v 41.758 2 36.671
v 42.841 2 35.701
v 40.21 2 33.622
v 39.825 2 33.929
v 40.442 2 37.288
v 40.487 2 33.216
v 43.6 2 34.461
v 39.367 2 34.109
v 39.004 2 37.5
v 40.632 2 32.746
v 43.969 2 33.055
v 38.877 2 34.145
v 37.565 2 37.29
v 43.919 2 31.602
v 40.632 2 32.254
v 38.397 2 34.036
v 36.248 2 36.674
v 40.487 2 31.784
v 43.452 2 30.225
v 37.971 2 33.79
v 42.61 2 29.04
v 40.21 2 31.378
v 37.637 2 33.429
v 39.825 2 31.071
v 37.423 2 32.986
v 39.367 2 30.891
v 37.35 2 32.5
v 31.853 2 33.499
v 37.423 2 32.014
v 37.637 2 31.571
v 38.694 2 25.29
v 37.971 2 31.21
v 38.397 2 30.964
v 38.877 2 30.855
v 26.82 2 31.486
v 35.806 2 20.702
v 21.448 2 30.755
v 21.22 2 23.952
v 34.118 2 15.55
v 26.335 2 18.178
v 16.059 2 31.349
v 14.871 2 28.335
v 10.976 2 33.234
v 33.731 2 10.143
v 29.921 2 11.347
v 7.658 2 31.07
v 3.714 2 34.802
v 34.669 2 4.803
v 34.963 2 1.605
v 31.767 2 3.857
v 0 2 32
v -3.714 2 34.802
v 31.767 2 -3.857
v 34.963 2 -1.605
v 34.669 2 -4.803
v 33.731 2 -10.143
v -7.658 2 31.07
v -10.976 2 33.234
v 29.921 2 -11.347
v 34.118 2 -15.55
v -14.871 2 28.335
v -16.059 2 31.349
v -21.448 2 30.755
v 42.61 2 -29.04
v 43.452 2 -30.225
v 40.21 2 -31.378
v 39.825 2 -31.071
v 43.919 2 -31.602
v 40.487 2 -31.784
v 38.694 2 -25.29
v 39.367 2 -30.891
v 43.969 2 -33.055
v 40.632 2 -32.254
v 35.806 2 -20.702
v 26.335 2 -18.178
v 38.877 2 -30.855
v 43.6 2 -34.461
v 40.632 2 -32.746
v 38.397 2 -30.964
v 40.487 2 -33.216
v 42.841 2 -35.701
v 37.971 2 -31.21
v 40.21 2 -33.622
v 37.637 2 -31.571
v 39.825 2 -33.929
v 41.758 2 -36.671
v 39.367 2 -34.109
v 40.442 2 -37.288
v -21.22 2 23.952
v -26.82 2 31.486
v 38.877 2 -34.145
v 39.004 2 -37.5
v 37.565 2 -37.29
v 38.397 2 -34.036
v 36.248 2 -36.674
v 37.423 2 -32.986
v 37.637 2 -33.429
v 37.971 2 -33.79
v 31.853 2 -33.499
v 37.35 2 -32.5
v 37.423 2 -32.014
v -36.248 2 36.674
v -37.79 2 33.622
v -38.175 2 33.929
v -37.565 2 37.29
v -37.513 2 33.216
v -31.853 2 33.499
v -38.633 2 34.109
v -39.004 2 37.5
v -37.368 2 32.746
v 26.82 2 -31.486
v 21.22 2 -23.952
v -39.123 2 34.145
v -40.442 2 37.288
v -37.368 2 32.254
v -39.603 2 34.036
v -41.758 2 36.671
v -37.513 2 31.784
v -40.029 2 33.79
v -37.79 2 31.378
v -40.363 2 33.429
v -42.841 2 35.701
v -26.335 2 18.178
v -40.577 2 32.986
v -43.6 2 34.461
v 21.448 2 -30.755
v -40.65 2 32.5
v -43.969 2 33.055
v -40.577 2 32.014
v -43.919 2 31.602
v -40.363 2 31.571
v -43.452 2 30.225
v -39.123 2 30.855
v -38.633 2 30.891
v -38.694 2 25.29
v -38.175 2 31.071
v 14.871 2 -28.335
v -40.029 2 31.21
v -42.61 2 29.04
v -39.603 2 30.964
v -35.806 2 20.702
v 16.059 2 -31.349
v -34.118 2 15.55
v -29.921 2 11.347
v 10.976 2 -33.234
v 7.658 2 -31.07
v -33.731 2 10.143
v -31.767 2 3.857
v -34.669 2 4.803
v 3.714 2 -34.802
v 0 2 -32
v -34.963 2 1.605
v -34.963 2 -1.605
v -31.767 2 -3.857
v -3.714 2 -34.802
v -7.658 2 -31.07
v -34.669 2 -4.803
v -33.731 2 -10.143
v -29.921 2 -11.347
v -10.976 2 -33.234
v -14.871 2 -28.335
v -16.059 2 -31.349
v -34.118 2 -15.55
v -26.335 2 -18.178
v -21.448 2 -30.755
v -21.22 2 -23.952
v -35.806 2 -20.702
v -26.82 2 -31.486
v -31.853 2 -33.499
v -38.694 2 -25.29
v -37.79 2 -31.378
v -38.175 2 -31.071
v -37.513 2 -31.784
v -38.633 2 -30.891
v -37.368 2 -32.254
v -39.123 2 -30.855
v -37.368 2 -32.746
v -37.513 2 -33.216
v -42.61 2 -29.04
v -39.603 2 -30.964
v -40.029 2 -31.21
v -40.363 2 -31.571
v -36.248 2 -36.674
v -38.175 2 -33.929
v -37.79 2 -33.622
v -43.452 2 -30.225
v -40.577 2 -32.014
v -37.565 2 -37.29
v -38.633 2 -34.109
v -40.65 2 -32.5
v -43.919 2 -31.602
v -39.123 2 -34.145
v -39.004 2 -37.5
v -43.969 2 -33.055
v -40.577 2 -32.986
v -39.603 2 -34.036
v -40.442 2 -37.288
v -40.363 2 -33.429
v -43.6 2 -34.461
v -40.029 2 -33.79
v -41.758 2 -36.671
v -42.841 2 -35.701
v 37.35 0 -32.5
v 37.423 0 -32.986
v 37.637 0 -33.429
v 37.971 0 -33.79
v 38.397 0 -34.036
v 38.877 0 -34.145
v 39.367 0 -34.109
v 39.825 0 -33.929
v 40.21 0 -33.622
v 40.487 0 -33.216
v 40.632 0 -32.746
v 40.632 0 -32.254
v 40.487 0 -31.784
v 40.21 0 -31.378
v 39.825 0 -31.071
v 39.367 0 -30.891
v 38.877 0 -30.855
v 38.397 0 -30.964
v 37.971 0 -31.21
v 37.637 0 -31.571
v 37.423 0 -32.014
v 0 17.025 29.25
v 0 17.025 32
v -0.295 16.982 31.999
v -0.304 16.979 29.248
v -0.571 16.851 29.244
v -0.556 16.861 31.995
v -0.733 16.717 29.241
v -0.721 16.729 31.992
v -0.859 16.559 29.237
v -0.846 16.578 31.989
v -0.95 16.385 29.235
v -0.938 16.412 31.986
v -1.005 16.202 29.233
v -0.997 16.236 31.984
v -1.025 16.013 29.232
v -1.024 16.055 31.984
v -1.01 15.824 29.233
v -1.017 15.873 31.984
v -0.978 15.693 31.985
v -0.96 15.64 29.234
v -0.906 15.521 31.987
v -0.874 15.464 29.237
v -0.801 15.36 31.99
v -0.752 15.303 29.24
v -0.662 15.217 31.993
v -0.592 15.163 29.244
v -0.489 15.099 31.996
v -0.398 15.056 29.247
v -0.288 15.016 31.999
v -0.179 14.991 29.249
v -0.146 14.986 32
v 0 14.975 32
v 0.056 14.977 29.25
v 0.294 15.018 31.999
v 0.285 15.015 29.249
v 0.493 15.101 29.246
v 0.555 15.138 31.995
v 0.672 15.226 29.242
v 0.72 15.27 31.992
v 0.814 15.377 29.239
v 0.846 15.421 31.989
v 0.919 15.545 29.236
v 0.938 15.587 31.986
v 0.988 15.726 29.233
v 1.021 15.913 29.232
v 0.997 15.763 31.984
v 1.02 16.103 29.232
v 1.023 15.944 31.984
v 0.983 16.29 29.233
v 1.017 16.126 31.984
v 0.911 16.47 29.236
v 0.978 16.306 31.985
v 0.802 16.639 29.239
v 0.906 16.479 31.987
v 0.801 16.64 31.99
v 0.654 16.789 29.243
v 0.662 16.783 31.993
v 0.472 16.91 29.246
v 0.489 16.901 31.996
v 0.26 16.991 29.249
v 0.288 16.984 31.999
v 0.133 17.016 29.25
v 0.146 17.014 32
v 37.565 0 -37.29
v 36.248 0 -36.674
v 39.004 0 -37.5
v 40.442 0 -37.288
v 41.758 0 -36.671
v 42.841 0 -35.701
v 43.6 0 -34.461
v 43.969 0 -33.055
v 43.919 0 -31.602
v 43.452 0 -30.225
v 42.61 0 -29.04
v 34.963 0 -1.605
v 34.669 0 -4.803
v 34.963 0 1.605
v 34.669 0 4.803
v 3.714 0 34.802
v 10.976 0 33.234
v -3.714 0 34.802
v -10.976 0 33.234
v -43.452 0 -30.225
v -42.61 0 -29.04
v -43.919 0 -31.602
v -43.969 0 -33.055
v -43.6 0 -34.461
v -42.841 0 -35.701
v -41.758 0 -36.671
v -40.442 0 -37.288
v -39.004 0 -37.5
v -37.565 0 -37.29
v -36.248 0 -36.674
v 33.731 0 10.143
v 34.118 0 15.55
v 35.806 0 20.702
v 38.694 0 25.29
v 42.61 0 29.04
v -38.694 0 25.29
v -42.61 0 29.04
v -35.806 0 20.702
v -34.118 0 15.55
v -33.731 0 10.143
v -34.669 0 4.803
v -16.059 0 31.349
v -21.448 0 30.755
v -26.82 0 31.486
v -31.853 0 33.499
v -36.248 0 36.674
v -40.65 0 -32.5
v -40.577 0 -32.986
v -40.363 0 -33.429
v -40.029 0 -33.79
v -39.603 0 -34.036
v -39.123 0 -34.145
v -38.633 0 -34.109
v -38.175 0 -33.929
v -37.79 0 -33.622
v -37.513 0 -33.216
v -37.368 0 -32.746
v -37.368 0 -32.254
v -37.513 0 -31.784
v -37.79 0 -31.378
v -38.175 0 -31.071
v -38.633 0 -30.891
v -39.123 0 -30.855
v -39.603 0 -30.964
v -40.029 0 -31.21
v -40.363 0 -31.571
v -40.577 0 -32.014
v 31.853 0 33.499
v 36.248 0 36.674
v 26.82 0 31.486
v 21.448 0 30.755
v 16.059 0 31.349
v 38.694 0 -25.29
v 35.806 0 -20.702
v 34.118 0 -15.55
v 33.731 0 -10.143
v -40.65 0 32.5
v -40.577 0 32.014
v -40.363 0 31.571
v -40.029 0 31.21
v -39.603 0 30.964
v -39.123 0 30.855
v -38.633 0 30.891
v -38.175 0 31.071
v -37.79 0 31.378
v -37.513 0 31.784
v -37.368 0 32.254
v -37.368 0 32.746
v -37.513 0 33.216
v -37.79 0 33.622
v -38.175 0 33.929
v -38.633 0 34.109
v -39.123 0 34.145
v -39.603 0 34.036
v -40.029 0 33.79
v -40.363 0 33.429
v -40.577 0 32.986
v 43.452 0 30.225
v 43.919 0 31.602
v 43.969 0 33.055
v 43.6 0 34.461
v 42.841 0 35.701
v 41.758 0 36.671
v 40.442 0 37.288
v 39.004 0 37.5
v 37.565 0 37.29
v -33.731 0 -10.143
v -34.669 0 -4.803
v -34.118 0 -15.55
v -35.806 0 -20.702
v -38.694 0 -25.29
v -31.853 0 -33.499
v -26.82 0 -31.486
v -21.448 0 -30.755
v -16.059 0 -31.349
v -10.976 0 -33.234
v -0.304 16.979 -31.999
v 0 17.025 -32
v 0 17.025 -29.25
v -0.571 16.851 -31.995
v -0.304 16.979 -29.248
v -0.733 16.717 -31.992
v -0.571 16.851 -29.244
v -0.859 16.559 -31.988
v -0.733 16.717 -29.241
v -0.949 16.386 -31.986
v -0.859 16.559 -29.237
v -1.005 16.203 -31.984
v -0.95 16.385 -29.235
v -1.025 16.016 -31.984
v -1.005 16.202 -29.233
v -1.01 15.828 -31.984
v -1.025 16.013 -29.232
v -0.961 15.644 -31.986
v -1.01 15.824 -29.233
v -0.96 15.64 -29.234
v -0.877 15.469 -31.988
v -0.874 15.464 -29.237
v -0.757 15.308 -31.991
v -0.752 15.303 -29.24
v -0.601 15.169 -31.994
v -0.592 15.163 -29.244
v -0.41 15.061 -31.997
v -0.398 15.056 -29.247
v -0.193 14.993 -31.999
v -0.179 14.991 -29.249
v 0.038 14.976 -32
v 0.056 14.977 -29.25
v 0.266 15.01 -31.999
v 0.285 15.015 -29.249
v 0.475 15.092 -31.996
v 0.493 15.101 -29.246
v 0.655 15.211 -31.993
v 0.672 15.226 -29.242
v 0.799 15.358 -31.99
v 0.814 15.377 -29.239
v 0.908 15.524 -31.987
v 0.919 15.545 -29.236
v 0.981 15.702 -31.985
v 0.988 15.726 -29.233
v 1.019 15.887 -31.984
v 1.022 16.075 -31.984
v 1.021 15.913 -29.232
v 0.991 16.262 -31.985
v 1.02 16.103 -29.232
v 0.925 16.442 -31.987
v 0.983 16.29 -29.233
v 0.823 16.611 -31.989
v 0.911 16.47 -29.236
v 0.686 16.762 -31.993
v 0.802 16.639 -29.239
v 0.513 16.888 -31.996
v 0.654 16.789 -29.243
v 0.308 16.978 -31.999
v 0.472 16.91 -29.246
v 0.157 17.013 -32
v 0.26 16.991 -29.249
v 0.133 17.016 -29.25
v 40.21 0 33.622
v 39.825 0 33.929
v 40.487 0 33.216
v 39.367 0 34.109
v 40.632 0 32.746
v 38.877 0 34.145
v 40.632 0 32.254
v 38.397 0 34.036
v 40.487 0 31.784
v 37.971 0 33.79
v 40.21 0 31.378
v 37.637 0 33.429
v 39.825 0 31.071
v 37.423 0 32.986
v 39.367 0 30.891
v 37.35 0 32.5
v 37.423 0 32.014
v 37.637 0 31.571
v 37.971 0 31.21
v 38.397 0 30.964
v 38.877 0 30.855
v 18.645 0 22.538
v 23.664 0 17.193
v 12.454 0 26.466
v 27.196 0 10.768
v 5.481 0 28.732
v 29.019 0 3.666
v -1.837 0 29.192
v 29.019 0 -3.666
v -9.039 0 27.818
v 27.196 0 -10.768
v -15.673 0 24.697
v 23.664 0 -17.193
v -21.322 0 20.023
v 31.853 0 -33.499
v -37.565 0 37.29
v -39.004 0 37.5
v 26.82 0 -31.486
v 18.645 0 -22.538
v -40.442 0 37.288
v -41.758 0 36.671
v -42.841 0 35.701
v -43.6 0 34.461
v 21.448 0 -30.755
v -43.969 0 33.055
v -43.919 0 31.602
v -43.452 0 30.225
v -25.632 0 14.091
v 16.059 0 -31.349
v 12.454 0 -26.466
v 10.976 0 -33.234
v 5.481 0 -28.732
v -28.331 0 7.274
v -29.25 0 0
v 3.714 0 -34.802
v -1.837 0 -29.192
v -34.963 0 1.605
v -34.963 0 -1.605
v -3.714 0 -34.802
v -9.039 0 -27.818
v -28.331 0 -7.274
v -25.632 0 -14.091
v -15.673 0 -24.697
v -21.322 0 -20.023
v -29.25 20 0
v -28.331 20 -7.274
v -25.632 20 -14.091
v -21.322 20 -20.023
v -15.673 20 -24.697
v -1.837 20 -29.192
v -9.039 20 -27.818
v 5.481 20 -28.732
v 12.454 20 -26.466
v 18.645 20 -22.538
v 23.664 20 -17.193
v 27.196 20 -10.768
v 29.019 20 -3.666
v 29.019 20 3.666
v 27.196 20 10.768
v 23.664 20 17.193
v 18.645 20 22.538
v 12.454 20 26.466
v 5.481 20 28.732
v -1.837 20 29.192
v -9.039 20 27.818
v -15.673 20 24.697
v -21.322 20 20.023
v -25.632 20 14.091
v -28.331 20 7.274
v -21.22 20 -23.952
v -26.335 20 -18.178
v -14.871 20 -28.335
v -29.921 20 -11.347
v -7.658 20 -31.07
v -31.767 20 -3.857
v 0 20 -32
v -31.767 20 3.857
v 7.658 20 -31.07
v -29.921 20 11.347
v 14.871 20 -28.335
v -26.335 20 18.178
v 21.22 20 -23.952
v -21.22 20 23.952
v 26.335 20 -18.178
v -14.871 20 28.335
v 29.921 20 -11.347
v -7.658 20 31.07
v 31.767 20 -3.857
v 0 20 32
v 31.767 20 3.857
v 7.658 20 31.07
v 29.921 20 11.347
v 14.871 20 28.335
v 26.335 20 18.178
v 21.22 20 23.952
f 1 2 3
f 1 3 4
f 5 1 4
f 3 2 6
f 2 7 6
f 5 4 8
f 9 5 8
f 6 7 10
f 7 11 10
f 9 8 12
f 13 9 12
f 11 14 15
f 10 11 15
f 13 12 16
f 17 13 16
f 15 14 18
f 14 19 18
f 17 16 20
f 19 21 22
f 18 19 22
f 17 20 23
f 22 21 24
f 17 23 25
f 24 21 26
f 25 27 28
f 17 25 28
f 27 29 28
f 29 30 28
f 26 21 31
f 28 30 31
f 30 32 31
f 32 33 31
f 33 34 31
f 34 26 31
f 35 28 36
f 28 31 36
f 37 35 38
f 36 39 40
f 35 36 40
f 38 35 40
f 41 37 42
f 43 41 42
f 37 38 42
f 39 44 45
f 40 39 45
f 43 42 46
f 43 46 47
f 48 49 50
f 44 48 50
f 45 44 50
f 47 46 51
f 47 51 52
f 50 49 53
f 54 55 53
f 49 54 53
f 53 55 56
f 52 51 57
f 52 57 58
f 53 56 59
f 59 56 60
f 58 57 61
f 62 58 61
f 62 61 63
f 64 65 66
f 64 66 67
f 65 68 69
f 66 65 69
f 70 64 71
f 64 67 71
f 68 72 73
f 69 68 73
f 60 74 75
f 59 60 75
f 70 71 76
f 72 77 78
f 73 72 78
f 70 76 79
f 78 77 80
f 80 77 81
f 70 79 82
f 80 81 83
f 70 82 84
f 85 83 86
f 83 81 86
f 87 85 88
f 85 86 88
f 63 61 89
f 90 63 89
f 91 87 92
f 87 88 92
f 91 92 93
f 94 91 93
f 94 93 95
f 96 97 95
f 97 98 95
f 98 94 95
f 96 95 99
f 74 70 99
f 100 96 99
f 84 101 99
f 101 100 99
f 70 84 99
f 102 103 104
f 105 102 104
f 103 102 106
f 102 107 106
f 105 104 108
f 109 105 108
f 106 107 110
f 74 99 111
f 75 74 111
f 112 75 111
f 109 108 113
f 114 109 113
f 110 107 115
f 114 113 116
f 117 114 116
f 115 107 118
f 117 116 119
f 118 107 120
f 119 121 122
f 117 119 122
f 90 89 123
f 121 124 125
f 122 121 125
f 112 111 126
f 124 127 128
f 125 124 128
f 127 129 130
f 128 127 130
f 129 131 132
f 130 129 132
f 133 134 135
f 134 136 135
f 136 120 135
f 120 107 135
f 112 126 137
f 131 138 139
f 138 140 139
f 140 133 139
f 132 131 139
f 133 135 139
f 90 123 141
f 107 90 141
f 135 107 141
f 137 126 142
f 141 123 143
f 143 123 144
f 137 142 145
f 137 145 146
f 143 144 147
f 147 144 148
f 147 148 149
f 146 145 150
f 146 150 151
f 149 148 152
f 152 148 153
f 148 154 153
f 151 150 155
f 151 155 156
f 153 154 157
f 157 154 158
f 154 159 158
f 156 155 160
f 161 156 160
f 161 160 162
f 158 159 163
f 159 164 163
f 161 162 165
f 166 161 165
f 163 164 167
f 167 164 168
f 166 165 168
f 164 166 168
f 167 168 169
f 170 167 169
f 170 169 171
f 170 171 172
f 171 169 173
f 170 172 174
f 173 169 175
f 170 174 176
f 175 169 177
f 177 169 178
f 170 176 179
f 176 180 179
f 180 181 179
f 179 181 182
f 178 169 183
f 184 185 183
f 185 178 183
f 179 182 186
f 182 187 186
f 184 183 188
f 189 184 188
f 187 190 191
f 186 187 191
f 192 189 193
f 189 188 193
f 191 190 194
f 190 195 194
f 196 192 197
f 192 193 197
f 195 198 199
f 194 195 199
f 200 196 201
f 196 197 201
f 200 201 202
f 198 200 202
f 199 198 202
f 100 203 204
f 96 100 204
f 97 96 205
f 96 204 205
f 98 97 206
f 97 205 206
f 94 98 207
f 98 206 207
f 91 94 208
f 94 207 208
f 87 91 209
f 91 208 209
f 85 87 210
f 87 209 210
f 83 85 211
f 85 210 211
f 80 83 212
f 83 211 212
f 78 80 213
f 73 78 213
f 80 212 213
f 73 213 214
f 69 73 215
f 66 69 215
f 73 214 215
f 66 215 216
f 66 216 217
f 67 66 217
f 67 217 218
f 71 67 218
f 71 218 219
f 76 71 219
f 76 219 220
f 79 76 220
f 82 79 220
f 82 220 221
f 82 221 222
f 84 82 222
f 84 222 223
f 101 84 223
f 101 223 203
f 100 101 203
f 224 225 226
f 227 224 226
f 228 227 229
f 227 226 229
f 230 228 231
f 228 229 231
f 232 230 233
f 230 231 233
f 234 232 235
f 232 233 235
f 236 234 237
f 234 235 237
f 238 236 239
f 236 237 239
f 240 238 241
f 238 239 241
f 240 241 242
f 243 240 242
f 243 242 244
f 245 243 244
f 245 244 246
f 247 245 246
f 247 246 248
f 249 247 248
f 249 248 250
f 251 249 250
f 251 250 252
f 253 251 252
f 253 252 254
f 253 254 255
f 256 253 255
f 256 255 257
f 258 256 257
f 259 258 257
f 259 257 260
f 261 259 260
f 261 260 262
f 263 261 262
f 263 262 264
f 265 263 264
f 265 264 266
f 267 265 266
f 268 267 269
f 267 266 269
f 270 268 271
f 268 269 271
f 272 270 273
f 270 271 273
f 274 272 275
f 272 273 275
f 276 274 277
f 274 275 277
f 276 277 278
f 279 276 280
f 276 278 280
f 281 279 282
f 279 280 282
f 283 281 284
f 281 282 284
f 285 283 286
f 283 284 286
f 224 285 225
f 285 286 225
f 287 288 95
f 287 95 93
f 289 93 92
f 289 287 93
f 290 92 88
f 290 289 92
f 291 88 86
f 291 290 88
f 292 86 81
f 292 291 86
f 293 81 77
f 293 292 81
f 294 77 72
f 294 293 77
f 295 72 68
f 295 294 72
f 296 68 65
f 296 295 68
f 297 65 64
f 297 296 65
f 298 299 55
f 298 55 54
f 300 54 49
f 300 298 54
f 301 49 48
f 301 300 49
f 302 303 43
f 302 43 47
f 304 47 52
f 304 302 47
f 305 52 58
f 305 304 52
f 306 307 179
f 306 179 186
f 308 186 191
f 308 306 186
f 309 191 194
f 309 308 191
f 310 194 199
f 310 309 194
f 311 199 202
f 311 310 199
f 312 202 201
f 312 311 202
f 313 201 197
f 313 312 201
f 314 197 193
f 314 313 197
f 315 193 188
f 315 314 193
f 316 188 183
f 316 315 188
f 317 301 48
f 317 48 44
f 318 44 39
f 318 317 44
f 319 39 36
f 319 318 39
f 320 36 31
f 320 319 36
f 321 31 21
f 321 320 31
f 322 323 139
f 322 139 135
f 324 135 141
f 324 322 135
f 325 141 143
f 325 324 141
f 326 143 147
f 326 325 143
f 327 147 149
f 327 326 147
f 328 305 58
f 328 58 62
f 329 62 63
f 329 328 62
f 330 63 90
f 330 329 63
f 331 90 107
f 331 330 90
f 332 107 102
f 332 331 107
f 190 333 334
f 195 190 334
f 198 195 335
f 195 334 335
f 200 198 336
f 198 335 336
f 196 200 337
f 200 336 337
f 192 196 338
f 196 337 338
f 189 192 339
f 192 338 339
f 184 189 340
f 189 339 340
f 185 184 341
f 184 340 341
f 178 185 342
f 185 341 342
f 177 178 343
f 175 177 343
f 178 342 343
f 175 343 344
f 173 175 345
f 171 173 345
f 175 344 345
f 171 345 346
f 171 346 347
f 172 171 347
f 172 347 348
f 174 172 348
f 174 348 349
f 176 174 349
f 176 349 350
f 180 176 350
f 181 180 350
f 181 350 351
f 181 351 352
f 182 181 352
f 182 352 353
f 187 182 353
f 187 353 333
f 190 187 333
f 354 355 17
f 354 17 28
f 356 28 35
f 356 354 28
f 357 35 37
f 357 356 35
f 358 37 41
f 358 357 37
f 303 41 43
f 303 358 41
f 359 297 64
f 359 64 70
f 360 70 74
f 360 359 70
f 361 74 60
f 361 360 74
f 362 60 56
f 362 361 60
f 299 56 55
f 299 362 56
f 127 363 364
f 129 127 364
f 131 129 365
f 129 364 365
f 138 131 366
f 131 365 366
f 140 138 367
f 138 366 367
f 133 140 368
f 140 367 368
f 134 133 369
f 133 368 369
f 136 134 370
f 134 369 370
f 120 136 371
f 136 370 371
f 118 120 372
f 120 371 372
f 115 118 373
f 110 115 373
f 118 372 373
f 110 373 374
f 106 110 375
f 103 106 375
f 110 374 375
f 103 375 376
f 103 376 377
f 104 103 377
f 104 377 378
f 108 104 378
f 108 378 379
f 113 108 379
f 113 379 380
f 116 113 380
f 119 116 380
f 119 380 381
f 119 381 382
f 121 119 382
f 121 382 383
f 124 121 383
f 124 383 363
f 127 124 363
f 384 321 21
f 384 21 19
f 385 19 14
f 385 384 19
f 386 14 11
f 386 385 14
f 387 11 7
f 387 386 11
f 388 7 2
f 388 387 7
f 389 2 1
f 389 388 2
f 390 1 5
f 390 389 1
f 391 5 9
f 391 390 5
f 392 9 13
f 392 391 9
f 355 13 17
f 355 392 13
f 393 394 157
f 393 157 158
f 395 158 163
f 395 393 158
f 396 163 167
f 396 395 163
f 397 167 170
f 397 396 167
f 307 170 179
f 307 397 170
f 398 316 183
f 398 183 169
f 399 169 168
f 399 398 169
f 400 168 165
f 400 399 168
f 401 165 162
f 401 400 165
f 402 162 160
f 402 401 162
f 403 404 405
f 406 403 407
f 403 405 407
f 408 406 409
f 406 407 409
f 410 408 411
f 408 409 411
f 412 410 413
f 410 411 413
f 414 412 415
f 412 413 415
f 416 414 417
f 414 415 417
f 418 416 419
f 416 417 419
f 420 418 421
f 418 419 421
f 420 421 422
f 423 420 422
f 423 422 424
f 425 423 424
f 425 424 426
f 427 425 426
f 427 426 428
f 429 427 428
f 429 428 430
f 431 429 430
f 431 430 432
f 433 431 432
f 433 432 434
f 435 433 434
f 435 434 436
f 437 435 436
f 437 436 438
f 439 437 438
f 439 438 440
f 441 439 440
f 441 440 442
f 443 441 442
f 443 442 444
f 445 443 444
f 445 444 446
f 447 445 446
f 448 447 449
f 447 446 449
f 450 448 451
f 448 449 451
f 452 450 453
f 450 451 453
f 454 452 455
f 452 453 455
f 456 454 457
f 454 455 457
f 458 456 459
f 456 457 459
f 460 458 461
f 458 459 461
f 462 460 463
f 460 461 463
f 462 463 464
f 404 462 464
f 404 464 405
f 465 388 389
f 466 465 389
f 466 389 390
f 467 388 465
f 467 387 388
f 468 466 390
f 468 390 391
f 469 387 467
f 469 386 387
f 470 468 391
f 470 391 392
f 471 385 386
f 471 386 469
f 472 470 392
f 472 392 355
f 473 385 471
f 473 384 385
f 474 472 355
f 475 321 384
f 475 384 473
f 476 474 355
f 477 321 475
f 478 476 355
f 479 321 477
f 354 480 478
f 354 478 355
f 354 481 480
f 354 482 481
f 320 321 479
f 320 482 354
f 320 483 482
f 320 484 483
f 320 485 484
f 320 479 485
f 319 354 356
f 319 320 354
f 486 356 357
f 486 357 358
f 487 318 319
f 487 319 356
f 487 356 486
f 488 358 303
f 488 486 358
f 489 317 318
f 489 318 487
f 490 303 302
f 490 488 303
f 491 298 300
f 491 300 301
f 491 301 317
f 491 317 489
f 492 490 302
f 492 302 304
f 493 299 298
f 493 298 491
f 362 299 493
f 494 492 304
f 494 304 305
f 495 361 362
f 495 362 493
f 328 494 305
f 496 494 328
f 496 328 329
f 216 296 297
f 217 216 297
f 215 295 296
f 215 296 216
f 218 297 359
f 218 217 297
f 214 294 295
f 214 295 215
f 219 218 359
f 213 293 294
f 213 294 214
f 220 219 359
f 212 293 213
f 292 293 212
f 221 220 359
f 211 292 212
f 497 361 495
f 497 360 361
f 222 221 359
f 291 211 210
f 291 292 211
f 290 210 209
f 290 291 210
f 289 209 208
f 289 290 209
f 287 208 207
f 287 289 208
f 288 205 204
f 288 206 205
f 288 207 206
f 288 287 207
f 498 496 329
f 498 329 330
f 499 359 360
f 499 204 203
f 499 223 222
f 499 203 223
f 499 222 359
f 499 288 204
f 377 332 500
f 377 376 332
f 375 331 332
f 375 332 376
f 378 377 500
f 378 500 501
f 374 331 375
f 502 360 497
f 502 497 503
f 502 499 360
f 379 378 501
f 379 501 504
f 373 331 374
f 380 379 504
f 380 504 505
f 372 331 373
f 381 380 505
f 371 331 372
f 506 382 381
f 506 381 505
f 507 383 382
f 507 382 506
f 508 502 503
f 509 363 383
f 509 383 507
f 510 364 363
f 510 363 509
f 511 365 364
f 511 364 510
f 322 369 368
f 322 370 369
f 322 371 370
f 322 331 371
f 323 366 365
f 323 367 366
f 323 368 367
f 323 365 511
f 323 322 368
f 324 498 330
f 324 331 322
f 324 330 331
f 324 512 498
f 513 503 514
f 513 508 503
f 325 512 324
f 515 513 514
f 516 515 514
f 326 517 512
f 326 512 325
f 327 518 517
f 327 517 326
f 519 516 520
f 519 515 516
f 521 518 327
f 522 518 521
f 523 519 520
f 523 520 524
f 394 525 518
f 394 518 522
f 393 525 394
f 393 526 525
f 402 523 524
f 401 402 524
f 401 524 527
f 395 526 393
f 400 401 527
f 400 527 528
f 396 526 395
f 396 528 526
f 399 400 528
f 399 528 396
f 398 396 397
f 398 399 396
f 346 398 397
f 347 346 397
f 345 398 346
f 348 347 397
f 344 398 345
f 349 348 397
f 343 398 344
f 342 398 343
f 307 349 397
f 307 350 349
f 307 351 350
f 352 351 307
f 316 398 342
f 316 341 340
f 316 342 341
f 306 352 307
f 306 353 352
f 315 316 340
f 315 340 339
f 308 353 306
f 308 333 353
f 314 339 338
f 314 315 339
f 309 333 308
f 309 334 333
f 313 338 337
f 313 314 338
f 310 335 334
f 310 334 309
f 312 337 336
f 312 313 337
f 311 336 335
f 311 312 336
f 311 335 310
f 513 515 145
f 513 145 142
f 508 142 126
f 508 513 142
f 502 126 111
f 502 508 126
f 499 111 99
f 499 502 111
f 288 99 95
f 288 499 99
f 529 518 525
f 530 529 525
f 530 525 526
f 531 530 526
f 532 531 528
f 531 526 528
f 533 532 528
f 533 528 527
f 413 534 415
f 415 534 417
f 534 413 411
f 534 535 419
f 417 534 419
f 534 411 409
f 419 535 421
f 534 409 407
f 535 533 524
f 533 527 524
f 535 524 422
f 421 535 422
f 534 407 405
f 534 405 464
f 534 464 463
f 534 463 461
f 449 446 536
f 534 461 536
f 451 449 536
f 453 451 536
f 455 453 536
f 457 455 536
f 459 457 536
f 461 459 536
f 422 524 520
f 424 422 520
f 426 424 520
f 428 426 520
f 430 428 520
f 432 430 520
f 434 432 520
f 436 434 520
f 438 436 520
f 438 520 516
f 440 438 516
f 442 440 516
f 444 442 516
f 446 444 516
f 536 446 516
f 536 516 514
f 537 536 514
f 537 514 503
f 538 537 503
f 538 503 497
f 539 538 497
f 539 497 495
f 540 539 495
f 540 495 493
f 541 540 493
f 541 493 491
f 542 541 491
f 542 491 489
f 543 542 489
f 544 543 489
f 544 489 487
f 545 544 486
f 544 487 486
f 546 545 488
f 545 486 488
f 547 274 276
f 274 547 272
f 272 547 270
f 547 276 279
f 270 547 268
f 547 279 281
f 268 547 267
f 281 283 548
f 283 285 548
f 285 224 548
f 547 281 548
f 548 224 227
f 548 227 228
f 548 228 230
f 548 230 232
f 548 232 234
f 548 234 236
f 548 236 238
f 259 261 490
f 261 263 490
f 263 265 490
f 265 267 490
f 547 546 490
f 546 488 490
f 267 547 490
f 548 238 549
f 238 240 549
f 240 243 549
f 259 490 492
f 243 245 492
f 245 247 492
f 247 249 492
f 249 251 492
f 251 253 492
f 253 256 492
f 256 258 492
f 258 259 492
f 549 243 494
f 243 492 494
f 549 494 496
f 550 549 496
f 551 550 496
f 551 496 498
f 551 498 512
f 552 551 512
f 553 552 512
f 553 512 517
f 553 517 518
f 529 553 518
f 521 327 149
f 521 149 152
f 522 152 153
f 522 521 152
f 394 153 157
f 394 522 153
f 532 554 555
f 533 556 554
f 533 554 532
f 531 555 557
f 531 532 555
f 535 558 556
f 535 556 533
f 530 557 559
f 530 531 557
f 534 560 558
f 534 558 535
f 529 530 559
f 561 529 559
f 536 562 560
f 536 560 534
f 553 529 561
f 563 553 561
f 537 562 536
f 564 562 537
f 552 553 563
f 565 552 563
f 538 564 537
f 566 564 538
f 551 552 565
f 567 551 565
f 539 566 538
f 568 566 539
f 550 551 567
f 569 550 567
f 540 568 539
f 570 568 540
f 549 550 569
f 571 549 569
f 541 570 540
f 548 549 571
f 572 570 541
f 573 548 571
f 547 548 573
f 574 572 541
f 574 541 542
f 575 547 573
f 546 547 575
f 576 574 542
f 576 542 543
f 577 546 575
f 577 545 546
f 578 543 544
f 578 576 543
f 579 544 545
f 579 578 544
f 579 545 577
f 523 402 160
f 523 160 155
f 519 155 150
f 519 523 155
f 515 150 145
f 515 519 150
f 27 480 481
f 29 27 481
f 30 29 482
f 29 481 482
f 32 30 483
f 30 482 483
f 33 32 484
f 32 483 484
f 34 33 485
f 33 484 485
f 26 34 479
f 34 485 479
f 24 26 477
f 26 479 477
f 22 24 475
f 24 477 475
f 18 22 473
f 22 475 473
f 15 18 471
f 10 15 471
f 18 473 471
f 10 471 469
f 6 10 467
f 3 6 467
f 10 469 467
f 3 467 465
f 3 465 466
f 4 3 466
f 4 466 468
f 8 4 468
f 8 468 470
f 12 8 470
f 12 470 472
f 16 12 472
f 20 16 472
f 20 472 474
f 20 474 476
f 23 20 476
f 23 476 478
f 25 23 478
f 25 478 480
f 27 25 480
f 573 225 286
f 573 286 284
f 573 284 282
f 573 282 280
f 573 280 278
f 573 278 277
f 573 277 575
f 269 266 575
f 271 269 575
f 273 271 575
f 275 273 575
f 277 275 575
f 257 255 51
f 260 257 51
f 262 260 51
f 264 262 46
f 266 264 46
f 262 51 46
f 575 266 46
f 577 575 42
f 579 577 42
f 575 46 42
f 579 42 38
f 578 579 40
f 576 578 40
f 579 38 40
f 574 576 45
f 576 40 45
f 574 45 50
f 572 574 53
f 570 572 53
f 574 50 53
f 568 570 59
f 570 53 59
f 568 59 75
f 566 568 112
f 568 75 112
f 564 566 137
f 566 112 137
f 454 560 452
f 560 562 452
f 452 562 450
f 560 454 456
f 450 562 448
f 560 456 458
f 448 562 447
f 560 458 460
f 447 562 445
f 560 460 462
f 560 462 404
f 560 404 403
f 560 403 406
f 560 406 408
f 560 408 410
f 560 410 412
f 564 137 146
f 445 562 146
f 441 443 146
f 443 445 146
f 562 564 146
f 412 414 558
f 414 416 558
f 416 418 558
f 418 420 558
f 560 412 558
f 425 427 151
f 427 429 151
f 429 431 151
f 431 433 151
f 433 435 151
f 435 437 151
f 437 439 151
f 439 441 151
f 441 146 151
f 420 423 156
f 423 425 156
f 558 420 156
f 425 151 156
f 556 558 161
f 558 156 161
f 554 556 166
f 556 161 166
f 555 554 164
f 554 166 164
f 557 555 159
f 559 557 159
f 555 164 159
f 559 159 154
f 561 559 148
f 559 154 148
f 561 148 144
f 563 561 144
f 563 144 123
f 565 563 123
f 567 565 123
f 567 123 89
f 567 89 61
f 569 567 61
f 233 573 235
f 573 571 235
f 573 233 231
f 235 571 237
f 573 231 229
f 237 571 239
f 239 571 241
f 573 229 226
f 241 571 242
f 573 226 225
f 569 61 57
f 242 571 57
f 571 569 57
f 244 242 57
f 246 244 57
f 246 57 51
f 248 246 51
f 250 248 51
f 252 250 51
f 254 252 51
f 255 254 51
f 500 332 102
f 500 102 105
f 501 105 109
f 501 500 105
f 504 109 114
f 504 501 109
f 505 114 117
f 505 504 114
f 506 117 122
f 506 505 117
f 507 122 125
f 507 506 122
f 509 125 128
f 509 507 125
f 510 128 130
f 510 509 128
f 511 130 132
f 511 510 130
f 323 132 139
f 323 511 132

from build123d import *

# Parameters (mm, degrees)
EXTRUDE_2_DEPTH     = 2
SKETCH_2_R          = 32
EXTRUDE_3_DEPTH     = 18
SKETCH_10_W         = 1.025
SKETCH_10_H         = 37.5
HOLE_WIZARD_M4_2_D  = 3.3
HOLE_WIZARD_M60_2_D = 58.5


with BuildPart() as part:
    # 草图1 → 凸台-拉伸2 (new body)
    with BuildSketch(Plane(origin=(0, 0, 0), x_dir=(1, 0, 0), z_dir=(0, 1, 0))):
        with BuildLine():
            ThreePointArc((36.247895087, 36.674436315), (42.841106398, 35.700921998), (42.609721719, 29.040244357))
            ThreePointArc((42.609721719, 29.040244357), (34.804095286, 18.178082868), (34.668896044, 4.802879043))
            ThreePointArc((34.668896044, 4.802879043), (35, 0), (34.668896044, -4.802879043))
            ThreePointArc((34.668896044, -4.802879043), (34.804095286, -18.178082868), (42.609721719, -29.040244357))
            ThreePointArc((42.609721719, -29.040244357), (42.841106398, -35.700921998), (36.247895087, -36.674436315))
            ThreePointArc((36.247895087, -36.674436315), (24.15622984, -30.955521404), (10.97591146, -33.234460544))
            ThreePointArc((10.97591146, -33.234460544), (0, -35), (-10.97591146, -33.234460544))
            ThreePointArc((-10.97591146, -33.234460544), (-24.15622984, -30.955521404), (-36.247895087, -36.674436315))
            ThreePointArc((-36.247895087, -36.674436315), (-42.841106398, -35.700921998), (-42.609721719, -29.040244357))
            ThreePointArc((-42.609721719, -29.040244357), (-34.804095286, -18.178082868), (-34.668896044, -4.802879043))
            ThreePointArc((-34.668896044, -4.802879043), (-35, 0), (-34.668896044, 4.802879043))
            ThreePointArc((-34.668896044, 4.802879043), (-34.804095286, 18.178082868), (-42.609721719, 29.040244357))
            ThreePointArc((-42.609721719, 29.040244357), (-42.841106398, 35.700921998), (-36.247895087, 36.674436315))
            ThreePointArc((-36.247895087, 36.674436315), (-24.15622984, 30.955521404), (-10.97591146, 33.234460544))
            ThreePointArc((-10.97591146, 33.234460544), (0, 35), (10.97591146, 33.234460544))
            ThreePointArc((10.97591146, 33.234460544), (24.15622984, 30.955521404), (36.247895087, 36.674436315))
        make_face()
    extrude(amount=EXTRUDE_2_DEPTH)

    # 草图2 → 凸台-拉伸3 (add)
    with BuildSketch(Plane(origin=(0, 2, 0), x_dir=(1, 0, 0), z_dir=(0, 1, 0))):
        with Locations(Location((0, 0, 0), (0, 0, 270))):
            Circle(SKETCH_2_R)
    extrude(amount=EXTRUDE_3_DEPTH)

    # 草图10 → M2.5 螺纹孔1 (revolve, cut)
    with BuildSketch(Plane(origin=(0, 16, 0), x_dir=(0, 1, 0), z_dir=(1, 0, 0))):
        with Locations((0.5125, 18.75)):
            Rectangle(SKETCH_10_W, SKETCH_10_H)
    hole_wizard_m2_5_1 = revolve(axis=Axis((0, 16, -6.35), (0, 0, 1)), mode=Mode.SUBTRACT)

    # 镜向3: M2.5 螺纹孔1 across plane
    add(hole_wizard_m2_5_1.mirror(Plane.XY), mode=Mode.SUBTRACT)

    # M4 螺纹孔2 (through all)
    with Locations(Plane(origin=(0, 20, 0), x_dir=(1, 0, 0), z_dir=(0, 1, 0))):
        with Locations((-39, 32.5), (-39, -32.5), (39, -32.5), (39, 32.5)):
            Hole(HOLE_WIZARD_M4_2_D / 2)

    # M60 螺纹孔2 (through all)
    with Locations(Plane(origin=(0, 20, 0), x_dir=(1, 0, 0), z_dir=(0, 1, 0))):
        with Locations((0, 0)):
            Hole(HOLE_WIZARD_M60_2_D / 2)


solid = part.part
